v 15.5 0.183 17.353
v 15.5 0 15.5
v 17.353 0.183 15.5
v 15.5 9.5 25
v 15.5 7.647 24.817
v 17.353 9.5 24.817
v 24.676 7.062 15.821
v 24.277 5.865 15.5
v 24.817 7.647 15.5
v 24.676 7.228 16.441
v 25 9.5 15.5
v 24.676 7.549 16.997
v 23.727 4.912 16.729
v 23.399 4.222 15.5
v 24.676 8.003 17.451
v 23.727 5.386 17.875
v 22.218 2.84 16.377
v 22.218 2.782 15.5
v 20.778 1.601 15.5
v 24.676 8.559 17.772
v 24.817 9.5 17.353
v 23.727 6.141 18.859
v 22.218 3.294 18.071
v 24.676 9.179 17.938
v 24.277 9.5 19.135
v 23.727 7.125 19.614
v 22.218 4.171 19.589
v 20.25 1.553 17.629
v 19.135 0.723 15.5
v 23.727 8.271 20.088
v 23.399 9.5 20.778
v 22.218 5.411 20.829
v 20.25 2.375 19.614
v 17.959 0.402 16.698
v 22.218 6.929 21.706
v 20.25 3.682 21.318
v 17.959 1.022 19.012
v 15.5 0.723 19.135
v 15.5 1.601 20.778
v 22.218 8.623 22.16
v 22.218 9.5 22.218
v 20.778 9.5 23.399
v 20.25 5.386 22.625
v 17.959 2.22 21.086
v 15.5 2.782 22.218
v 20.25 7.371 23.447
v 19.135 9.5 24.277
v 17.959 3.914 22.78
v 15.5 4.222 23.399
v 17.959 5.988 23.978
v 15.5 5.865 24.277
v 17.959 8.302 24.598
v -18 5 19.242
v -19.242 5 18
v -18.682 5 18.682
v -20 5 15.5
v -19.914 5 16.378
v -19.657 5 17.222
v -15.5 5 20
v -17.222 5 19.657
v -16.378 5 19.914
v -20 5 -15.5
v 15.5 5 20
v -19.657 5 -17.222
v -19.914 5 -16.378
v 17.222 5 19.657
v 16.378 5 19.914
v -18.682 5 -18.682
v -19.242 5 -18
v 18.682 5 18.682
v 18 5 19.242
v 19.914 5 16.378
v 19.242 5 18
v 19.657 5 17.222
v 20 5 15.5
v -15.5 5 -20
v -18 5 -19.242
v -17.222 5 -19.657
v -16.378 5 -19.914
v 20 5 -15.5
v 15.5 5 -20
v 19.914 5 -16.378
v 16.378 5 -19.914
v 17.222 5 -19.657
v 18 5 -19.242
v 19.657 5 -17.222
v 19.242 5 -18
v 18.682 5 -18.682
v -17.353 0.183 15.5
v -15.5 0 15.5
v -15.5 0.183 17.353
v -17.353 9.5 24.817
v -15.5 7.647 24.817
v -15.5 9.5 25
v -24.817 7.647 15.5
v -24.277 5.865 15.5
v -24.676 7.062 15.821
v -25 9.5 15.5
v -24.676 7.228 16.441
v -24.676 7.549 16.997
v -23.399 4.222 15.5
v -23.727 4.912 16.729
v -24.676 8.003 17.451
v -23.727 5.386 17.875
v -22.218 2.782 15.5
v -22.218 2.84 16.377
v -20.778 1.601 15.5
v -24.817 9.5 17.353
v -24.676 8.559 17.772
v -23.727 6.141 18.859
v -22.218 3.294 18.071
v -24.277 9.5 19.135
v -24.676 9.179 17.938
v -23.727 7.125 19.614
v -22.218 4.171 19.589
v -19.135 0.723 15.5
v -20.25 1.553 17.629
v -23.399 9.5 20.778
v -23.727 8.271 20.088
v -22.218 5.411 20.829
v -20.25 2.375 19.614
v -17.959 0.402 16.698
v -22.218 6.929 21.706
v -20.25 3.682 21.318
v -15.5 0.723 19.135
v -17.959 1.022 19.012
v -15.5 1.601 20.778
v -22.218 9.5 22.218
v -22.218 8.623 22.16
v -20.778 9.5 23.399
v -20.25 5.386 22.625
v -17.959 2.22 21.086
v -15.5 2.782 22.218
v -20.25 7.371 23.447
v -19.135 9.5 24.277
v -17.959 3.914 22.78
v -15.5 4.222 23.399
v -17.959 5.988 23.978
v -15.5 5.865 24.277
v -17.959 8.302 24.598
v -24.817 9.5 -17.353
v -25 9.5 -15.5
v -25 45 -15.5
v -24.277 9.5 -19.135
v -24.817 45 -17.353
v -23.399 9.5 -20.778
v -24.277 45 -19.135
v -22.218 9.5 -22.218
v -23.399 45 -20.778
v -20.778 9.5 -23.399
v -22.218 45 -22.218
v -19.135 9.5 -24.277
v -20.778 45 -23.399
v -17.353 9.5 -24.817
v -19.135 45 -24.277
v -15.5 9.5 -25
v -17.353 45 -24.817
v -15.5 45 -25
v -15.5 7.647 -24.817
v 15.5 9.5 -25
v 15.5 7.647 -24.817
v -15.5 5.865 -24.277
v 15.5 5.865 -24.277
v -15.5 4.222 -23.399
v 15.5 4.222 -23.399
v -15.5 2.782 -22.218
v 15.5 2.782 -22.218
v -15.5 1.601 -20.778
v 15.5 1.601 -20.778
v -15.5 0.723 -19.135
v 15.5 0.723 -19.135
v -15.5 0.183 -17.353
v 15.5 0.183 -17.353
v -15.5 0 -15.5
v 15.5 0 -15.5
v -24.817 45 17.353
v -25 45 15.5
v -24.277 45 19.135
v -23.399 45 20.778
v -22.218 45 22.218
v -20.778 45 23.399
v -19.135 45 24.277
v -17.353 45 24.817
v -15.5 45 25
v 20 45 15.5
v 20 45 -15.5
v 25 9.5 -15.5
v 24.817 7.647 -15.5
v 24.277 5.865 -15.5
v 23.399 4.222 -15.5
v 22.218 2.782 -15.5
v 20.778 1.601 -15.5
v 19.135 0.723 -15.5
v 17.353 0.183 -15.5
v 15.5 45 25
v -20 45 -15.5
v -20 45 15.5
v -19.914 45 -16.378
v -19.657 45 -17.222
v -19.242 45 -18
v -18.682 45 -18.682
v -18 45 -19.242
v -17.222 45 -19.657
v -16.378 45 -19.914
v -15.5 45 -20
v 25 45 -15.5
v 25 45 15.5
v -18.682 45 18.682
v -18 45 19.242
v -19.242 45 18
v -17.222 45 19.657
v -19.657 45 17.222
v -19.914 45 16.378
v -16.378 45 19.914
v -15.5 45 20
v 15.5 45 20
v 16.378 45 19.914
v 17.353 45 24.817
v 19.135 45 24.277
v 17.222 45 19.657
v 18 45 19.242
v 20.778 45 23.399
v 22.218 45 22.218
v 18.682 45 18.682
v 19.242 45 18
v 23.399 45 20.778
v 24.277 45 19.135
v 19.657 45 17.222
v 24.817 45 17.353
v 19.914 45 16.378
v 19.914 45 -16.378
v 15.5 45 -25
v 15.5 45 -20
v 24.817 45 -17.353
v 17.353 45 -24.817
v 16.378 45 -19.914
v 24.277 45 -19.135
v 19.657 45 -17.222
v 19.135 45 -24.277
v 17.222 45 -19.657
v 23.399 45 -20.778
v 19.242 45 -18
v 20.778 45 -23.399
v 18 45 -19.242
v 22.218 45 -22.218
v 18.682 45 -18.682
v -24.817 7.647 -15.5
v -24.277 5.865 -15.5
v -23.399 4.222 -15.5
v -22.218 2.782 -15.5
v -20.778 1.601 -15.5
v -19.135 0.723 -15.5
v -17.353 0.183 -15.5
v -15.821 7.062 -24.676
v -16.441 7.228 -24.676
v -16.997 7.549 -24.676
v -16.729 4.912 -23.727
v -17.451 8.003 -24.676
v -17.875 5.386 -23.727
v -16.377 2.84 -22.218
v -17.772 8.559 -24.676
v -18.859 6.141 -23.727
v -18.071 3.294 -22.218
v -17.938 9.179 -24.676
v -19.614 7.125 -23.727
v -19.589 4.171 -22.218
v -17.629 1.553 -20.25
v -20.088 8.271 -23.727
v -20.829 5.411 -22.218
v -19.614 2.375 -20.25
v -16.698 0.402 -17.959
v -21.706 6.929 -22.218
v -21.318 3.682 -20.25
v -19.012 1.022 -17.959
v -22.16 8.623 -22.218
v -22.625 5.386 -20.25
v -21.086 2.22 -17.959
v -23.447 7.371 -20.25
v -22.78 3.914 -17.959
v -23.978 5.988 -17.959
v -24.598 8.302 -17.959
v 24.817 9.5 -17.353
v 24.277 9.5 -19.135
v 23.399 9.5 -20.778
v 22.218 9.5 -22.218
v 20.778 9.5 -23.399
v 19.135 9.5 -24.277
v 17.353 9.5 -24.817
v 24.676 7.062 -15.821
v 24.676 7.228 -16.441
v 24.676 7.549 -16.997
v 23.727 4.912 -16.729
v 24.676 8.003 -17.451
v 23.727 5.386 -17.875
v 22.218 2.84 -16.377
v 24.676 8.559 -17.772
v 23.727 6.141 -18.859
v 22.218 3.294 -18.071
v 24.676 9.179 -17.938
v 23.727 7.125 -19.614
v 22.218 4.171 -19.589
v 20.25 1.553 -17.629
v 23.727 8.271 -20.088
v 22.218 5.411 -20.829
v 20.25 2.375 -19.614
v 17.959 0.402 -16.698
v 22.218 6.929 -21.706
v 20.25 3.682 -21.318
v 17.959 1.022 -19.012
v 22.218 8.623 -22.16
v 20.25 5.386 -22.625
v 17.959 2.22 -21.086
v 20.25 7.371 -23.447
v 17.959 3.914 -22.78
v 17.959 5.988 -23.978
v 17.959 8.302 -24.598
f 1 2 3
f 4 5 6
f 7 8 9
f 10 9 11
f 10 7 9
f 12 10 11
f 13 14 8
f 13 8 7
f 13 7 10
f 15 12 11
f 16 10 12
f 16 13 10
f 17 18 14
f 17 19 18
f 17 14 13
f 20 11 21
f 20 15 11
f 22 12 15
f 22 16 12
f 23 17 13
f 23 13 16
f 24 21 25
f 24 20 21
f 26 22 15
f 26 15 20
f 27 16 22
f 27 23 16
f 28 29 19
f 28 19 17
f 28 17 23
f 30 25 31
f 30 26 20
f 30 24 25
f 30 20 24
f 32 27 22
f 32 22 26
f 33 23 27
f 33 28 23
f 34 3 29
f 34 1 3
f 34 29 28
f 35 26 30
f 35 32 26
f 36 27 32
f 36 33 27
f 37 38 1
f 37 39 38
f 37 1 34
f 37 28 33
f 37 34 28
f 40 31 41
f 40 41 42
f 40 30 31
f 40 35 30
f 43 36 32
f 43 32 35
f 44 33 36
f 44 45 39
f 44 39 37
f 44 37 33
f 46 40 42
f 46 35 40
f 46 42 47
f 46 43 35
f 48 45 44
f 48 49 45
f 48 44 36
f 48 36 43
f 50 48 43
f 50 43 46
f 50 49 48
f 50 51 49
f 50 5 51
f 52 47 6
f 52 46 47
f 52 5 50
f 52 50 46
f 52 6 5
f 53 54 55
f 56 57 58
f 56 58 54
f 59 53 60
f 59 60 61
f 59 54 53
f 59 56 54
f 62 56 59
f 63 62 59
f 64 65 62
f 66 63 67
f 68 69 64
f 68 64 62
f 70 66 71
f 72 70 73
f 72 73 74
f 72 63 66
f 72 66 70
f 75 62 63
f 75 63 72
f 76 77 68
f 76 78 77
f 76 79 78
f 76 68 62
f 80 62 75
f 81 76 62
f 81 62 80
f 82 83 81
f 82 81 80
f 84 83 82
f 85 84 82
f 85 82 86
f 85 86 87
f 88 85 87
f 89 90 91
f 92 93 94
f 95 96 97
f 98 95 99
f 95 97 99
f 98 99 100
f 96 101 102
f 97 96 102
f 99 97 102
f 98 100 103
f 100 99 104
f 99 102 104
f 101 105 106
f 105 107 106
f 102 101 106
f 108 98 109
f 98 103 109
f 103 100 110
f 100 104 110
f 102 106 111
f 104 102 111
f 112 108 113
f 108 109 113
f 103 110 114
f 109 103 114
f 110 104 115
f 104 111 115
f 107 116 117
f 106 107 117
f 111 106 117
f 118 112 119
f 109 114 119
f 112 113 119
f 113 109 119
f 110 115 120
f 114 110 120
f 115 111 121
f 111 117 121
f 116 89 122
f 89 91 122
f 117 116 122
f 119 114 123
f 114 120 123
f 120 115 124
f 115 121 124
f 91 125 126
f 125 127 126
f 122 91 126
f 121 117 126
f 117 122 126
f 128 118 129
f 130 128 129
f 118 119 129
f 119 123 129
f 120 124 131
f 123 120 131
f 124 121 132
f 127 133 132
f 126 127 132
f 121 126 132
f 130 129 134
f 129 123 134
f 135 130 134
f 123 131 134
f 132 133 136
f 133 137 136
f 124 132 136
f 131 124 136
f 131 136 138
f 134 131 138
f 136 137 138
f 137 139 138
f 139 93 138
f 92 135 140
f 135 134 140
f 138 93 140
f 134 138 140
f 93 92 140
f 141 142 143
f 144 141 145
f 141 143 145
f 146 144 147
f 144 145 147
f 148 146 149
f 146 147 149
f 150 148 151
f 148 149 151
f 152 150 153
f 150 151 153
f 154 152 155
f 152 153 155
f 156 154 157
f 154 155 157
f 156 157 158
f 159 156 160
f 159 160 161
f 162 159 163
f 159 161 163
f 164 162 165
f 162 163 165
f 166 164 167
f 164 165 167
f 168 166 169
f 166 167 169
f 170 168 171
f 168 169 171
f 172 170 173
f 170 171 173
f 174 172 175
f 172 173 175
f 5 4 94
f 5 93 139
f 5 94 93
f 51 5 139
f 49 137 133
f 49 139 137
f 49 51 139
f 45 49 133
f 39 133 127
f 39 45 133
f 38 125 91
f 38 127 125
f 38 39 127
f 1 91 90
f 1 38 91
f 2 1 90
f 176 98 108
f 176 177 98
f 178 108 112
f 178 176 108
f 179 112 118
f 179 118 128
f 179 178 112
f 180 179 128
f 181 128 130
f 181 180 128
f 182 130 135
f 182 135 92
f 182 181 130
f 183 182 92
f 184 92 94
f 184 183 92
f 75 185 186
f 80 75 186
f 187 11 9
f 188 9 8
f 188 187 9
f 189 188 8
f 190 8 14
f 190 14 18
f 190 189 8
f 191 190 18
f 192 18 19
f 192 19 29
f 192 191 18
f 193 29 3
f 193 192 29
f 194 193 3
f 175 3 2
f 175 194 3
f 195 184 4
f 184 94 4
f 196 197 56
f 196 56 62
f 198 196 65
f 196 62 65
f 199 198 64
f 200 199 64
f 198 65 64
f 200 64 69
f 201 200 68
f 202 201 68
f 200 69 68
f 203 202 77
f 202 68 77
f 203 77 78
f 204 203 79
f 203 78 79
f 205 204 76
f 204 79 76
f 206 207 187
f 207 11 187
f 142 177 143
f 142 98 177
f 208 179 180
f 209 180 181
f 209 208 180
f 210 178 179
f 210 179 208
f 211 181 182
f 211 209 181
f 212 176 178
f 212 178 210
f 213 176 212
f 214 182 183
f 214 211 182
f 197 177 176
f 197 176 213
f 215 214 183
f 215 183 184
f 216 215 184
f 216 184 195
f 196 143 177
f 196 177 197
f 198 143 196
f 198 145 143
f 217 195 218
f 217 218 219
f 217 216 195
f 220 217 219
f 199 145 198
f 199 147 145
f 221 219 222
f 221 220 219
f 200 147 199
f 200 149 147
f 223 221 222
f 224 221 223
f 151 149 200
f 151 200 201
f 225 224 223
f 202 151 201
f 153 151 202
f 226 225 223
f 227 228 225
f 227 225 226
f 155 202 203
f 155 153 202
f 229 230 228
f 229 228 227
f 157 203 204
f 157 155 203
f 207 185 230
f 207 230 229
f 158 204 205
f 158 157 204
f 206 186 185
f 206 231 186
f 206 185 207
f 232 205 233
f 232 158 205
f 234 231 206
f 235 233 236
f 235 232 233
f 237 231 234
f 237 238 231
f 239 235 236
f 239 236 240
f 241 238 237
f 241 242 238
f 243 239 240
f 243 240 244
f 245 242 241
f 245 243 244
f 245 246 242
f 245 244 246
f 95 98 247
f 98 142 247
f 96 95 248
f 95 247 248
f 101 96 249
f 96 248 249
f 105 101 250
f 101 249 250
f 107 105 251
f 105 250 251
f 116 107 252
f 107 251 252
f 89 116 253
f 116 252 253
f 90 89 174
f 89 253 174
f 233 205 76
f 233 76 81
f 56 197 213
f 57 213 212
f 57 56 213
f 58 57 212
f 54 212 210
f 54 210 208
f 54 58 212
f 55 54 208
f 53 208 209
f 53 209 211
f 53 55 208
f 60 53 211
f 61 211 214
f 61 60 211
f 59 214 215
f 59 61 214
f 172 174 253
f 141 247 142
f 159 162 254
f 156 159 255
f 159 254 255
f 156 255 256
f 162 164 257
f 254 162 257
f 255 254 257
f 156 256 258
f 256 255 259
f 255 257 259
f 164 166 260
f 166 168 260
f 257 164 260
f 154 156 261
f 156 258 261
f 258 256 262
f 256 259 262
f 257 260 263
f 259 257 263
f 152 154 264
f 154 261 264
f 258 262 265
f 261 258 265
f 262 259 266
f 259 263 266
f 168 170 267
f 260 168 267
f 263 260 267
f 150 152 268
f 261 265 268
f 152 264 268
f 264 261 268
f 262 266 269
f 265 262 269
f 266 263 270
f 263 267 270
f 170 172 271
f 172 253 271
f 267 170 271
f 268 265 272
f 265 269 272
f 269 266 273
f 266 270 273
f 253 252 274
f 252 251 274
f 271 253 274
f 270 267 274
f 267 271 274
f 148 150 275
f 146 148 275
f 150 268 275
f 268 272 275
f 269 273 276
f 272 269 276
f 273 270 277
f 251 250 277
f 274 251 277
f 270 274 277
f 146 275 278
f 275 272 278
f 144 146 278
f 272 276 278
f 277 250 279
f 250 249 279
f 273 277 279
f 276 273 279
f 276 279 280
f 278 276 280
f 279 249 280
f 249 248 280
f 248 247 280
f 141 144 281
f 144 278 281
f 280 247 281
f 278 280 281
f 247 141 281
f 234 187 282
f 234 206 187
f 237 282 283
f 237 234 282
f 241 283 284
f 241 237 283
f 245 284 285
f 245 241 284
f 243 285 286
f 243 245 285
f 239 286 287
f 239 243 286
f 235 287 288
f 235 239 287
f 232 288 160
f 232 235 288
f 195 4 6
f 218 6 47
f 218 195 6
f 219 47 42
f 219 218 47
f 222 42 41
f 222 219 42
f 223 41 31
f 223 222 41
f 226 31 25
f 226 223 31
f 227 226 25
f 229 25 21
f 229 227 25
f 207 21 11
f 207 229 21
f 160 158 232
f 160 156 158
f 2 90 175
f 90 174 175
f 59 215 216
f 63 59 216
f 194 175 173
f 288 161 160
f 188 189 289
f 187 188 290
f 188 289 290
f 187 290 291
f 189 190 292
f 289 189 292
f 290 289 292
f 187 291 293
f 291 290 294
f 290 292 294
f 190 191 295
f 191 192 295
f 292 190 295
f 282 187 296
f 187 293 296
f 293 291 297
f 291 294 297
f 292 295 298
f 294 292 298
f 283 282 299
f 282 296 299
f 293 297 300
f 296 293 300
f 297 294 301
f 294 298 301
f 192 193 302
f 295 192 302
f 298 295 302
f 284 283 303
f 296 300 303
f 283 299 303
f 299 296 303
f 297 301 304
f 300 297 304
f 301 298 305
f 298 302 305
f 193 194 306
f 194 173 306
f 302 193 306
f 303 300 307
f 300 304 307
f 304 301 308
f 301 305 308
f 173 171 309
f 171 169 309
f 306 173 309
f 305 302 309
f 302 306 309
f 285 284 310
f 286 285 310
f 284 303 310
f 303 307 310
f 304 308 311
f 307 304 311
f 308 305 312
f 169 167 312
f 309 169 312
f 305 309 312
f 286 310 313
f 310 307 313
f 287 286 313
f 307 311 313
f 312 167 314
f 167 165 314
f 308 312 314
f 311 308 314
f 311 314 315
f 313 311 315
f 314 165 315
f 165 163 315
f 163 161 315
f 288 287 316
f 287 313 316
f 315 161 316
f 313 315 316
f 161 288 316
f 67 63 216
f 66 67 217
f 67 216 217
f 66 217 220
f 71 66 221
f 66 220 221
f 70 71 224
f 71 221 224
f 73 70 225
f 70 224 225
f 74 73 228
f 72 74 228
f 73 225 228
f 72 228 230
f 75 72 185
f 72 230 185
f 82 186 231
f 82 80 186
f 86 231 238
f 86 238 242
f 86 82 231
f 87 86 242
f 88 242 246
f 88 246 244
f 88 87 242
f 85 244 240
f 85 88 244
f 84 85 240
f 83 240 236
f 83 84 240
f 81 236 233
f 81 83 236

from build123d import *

# Parameters (mm, degrees)
SKETCH1_W           = 50
SKETCH1_H           = 50
BOSS_EXTRUDE1_DEPTH = 45
SHELL1_T            = -5
FILLET1_R           = 4.5
FILLET2_R           = 9.5


with BuildPart() as part:
    # Sketch1 → Boss-Extrude1 (new body)
    with BuildSketch(Plane(origin=(0, 0, 0), x_dir=(1, 0, 0), z_dir=(0, 1, 0))):
        Rectangle(SKETCH1_W, SKETCH1_H)
    extrude(amount=BOSS_EXTRUDE1_DEPTH)

    # Shell1
    shell1_openings = [part.faces().sort_by_distance(p)[0] for p in [
        (0, 45, 0),
    ]]
    offset(amount=SHELL1_T, openings=shell1_openings, kind=Kind.INTERSECTION)

    # Fillet1
    fillet1_edges = [part.edges().sort_by_distance(p)[0] for p in [
        (20, 25, 20),
        (20, 25, -20),
        (-20, 25, -20),
        (-20, 25, 20),
    ]]
    fillet(fillet1_edges, radius=FILLET1_R)

    # Fillet2
    fillet2_edges = [part.edges().sort_by_distance(p)[0] for p in [
        (0, 0, 25),
        (-25, 0, 0),
        (0, 0, -25),
        (25, 0, 0),
        (25, 22.5, 25),
        (-25, 22.5, 25),
        (-25, 22.5, -25),
        (25, 22.5, -25),
    ]]
    fillet(fillet2_edges, radius=FILLET2_R)


solid = part.part
